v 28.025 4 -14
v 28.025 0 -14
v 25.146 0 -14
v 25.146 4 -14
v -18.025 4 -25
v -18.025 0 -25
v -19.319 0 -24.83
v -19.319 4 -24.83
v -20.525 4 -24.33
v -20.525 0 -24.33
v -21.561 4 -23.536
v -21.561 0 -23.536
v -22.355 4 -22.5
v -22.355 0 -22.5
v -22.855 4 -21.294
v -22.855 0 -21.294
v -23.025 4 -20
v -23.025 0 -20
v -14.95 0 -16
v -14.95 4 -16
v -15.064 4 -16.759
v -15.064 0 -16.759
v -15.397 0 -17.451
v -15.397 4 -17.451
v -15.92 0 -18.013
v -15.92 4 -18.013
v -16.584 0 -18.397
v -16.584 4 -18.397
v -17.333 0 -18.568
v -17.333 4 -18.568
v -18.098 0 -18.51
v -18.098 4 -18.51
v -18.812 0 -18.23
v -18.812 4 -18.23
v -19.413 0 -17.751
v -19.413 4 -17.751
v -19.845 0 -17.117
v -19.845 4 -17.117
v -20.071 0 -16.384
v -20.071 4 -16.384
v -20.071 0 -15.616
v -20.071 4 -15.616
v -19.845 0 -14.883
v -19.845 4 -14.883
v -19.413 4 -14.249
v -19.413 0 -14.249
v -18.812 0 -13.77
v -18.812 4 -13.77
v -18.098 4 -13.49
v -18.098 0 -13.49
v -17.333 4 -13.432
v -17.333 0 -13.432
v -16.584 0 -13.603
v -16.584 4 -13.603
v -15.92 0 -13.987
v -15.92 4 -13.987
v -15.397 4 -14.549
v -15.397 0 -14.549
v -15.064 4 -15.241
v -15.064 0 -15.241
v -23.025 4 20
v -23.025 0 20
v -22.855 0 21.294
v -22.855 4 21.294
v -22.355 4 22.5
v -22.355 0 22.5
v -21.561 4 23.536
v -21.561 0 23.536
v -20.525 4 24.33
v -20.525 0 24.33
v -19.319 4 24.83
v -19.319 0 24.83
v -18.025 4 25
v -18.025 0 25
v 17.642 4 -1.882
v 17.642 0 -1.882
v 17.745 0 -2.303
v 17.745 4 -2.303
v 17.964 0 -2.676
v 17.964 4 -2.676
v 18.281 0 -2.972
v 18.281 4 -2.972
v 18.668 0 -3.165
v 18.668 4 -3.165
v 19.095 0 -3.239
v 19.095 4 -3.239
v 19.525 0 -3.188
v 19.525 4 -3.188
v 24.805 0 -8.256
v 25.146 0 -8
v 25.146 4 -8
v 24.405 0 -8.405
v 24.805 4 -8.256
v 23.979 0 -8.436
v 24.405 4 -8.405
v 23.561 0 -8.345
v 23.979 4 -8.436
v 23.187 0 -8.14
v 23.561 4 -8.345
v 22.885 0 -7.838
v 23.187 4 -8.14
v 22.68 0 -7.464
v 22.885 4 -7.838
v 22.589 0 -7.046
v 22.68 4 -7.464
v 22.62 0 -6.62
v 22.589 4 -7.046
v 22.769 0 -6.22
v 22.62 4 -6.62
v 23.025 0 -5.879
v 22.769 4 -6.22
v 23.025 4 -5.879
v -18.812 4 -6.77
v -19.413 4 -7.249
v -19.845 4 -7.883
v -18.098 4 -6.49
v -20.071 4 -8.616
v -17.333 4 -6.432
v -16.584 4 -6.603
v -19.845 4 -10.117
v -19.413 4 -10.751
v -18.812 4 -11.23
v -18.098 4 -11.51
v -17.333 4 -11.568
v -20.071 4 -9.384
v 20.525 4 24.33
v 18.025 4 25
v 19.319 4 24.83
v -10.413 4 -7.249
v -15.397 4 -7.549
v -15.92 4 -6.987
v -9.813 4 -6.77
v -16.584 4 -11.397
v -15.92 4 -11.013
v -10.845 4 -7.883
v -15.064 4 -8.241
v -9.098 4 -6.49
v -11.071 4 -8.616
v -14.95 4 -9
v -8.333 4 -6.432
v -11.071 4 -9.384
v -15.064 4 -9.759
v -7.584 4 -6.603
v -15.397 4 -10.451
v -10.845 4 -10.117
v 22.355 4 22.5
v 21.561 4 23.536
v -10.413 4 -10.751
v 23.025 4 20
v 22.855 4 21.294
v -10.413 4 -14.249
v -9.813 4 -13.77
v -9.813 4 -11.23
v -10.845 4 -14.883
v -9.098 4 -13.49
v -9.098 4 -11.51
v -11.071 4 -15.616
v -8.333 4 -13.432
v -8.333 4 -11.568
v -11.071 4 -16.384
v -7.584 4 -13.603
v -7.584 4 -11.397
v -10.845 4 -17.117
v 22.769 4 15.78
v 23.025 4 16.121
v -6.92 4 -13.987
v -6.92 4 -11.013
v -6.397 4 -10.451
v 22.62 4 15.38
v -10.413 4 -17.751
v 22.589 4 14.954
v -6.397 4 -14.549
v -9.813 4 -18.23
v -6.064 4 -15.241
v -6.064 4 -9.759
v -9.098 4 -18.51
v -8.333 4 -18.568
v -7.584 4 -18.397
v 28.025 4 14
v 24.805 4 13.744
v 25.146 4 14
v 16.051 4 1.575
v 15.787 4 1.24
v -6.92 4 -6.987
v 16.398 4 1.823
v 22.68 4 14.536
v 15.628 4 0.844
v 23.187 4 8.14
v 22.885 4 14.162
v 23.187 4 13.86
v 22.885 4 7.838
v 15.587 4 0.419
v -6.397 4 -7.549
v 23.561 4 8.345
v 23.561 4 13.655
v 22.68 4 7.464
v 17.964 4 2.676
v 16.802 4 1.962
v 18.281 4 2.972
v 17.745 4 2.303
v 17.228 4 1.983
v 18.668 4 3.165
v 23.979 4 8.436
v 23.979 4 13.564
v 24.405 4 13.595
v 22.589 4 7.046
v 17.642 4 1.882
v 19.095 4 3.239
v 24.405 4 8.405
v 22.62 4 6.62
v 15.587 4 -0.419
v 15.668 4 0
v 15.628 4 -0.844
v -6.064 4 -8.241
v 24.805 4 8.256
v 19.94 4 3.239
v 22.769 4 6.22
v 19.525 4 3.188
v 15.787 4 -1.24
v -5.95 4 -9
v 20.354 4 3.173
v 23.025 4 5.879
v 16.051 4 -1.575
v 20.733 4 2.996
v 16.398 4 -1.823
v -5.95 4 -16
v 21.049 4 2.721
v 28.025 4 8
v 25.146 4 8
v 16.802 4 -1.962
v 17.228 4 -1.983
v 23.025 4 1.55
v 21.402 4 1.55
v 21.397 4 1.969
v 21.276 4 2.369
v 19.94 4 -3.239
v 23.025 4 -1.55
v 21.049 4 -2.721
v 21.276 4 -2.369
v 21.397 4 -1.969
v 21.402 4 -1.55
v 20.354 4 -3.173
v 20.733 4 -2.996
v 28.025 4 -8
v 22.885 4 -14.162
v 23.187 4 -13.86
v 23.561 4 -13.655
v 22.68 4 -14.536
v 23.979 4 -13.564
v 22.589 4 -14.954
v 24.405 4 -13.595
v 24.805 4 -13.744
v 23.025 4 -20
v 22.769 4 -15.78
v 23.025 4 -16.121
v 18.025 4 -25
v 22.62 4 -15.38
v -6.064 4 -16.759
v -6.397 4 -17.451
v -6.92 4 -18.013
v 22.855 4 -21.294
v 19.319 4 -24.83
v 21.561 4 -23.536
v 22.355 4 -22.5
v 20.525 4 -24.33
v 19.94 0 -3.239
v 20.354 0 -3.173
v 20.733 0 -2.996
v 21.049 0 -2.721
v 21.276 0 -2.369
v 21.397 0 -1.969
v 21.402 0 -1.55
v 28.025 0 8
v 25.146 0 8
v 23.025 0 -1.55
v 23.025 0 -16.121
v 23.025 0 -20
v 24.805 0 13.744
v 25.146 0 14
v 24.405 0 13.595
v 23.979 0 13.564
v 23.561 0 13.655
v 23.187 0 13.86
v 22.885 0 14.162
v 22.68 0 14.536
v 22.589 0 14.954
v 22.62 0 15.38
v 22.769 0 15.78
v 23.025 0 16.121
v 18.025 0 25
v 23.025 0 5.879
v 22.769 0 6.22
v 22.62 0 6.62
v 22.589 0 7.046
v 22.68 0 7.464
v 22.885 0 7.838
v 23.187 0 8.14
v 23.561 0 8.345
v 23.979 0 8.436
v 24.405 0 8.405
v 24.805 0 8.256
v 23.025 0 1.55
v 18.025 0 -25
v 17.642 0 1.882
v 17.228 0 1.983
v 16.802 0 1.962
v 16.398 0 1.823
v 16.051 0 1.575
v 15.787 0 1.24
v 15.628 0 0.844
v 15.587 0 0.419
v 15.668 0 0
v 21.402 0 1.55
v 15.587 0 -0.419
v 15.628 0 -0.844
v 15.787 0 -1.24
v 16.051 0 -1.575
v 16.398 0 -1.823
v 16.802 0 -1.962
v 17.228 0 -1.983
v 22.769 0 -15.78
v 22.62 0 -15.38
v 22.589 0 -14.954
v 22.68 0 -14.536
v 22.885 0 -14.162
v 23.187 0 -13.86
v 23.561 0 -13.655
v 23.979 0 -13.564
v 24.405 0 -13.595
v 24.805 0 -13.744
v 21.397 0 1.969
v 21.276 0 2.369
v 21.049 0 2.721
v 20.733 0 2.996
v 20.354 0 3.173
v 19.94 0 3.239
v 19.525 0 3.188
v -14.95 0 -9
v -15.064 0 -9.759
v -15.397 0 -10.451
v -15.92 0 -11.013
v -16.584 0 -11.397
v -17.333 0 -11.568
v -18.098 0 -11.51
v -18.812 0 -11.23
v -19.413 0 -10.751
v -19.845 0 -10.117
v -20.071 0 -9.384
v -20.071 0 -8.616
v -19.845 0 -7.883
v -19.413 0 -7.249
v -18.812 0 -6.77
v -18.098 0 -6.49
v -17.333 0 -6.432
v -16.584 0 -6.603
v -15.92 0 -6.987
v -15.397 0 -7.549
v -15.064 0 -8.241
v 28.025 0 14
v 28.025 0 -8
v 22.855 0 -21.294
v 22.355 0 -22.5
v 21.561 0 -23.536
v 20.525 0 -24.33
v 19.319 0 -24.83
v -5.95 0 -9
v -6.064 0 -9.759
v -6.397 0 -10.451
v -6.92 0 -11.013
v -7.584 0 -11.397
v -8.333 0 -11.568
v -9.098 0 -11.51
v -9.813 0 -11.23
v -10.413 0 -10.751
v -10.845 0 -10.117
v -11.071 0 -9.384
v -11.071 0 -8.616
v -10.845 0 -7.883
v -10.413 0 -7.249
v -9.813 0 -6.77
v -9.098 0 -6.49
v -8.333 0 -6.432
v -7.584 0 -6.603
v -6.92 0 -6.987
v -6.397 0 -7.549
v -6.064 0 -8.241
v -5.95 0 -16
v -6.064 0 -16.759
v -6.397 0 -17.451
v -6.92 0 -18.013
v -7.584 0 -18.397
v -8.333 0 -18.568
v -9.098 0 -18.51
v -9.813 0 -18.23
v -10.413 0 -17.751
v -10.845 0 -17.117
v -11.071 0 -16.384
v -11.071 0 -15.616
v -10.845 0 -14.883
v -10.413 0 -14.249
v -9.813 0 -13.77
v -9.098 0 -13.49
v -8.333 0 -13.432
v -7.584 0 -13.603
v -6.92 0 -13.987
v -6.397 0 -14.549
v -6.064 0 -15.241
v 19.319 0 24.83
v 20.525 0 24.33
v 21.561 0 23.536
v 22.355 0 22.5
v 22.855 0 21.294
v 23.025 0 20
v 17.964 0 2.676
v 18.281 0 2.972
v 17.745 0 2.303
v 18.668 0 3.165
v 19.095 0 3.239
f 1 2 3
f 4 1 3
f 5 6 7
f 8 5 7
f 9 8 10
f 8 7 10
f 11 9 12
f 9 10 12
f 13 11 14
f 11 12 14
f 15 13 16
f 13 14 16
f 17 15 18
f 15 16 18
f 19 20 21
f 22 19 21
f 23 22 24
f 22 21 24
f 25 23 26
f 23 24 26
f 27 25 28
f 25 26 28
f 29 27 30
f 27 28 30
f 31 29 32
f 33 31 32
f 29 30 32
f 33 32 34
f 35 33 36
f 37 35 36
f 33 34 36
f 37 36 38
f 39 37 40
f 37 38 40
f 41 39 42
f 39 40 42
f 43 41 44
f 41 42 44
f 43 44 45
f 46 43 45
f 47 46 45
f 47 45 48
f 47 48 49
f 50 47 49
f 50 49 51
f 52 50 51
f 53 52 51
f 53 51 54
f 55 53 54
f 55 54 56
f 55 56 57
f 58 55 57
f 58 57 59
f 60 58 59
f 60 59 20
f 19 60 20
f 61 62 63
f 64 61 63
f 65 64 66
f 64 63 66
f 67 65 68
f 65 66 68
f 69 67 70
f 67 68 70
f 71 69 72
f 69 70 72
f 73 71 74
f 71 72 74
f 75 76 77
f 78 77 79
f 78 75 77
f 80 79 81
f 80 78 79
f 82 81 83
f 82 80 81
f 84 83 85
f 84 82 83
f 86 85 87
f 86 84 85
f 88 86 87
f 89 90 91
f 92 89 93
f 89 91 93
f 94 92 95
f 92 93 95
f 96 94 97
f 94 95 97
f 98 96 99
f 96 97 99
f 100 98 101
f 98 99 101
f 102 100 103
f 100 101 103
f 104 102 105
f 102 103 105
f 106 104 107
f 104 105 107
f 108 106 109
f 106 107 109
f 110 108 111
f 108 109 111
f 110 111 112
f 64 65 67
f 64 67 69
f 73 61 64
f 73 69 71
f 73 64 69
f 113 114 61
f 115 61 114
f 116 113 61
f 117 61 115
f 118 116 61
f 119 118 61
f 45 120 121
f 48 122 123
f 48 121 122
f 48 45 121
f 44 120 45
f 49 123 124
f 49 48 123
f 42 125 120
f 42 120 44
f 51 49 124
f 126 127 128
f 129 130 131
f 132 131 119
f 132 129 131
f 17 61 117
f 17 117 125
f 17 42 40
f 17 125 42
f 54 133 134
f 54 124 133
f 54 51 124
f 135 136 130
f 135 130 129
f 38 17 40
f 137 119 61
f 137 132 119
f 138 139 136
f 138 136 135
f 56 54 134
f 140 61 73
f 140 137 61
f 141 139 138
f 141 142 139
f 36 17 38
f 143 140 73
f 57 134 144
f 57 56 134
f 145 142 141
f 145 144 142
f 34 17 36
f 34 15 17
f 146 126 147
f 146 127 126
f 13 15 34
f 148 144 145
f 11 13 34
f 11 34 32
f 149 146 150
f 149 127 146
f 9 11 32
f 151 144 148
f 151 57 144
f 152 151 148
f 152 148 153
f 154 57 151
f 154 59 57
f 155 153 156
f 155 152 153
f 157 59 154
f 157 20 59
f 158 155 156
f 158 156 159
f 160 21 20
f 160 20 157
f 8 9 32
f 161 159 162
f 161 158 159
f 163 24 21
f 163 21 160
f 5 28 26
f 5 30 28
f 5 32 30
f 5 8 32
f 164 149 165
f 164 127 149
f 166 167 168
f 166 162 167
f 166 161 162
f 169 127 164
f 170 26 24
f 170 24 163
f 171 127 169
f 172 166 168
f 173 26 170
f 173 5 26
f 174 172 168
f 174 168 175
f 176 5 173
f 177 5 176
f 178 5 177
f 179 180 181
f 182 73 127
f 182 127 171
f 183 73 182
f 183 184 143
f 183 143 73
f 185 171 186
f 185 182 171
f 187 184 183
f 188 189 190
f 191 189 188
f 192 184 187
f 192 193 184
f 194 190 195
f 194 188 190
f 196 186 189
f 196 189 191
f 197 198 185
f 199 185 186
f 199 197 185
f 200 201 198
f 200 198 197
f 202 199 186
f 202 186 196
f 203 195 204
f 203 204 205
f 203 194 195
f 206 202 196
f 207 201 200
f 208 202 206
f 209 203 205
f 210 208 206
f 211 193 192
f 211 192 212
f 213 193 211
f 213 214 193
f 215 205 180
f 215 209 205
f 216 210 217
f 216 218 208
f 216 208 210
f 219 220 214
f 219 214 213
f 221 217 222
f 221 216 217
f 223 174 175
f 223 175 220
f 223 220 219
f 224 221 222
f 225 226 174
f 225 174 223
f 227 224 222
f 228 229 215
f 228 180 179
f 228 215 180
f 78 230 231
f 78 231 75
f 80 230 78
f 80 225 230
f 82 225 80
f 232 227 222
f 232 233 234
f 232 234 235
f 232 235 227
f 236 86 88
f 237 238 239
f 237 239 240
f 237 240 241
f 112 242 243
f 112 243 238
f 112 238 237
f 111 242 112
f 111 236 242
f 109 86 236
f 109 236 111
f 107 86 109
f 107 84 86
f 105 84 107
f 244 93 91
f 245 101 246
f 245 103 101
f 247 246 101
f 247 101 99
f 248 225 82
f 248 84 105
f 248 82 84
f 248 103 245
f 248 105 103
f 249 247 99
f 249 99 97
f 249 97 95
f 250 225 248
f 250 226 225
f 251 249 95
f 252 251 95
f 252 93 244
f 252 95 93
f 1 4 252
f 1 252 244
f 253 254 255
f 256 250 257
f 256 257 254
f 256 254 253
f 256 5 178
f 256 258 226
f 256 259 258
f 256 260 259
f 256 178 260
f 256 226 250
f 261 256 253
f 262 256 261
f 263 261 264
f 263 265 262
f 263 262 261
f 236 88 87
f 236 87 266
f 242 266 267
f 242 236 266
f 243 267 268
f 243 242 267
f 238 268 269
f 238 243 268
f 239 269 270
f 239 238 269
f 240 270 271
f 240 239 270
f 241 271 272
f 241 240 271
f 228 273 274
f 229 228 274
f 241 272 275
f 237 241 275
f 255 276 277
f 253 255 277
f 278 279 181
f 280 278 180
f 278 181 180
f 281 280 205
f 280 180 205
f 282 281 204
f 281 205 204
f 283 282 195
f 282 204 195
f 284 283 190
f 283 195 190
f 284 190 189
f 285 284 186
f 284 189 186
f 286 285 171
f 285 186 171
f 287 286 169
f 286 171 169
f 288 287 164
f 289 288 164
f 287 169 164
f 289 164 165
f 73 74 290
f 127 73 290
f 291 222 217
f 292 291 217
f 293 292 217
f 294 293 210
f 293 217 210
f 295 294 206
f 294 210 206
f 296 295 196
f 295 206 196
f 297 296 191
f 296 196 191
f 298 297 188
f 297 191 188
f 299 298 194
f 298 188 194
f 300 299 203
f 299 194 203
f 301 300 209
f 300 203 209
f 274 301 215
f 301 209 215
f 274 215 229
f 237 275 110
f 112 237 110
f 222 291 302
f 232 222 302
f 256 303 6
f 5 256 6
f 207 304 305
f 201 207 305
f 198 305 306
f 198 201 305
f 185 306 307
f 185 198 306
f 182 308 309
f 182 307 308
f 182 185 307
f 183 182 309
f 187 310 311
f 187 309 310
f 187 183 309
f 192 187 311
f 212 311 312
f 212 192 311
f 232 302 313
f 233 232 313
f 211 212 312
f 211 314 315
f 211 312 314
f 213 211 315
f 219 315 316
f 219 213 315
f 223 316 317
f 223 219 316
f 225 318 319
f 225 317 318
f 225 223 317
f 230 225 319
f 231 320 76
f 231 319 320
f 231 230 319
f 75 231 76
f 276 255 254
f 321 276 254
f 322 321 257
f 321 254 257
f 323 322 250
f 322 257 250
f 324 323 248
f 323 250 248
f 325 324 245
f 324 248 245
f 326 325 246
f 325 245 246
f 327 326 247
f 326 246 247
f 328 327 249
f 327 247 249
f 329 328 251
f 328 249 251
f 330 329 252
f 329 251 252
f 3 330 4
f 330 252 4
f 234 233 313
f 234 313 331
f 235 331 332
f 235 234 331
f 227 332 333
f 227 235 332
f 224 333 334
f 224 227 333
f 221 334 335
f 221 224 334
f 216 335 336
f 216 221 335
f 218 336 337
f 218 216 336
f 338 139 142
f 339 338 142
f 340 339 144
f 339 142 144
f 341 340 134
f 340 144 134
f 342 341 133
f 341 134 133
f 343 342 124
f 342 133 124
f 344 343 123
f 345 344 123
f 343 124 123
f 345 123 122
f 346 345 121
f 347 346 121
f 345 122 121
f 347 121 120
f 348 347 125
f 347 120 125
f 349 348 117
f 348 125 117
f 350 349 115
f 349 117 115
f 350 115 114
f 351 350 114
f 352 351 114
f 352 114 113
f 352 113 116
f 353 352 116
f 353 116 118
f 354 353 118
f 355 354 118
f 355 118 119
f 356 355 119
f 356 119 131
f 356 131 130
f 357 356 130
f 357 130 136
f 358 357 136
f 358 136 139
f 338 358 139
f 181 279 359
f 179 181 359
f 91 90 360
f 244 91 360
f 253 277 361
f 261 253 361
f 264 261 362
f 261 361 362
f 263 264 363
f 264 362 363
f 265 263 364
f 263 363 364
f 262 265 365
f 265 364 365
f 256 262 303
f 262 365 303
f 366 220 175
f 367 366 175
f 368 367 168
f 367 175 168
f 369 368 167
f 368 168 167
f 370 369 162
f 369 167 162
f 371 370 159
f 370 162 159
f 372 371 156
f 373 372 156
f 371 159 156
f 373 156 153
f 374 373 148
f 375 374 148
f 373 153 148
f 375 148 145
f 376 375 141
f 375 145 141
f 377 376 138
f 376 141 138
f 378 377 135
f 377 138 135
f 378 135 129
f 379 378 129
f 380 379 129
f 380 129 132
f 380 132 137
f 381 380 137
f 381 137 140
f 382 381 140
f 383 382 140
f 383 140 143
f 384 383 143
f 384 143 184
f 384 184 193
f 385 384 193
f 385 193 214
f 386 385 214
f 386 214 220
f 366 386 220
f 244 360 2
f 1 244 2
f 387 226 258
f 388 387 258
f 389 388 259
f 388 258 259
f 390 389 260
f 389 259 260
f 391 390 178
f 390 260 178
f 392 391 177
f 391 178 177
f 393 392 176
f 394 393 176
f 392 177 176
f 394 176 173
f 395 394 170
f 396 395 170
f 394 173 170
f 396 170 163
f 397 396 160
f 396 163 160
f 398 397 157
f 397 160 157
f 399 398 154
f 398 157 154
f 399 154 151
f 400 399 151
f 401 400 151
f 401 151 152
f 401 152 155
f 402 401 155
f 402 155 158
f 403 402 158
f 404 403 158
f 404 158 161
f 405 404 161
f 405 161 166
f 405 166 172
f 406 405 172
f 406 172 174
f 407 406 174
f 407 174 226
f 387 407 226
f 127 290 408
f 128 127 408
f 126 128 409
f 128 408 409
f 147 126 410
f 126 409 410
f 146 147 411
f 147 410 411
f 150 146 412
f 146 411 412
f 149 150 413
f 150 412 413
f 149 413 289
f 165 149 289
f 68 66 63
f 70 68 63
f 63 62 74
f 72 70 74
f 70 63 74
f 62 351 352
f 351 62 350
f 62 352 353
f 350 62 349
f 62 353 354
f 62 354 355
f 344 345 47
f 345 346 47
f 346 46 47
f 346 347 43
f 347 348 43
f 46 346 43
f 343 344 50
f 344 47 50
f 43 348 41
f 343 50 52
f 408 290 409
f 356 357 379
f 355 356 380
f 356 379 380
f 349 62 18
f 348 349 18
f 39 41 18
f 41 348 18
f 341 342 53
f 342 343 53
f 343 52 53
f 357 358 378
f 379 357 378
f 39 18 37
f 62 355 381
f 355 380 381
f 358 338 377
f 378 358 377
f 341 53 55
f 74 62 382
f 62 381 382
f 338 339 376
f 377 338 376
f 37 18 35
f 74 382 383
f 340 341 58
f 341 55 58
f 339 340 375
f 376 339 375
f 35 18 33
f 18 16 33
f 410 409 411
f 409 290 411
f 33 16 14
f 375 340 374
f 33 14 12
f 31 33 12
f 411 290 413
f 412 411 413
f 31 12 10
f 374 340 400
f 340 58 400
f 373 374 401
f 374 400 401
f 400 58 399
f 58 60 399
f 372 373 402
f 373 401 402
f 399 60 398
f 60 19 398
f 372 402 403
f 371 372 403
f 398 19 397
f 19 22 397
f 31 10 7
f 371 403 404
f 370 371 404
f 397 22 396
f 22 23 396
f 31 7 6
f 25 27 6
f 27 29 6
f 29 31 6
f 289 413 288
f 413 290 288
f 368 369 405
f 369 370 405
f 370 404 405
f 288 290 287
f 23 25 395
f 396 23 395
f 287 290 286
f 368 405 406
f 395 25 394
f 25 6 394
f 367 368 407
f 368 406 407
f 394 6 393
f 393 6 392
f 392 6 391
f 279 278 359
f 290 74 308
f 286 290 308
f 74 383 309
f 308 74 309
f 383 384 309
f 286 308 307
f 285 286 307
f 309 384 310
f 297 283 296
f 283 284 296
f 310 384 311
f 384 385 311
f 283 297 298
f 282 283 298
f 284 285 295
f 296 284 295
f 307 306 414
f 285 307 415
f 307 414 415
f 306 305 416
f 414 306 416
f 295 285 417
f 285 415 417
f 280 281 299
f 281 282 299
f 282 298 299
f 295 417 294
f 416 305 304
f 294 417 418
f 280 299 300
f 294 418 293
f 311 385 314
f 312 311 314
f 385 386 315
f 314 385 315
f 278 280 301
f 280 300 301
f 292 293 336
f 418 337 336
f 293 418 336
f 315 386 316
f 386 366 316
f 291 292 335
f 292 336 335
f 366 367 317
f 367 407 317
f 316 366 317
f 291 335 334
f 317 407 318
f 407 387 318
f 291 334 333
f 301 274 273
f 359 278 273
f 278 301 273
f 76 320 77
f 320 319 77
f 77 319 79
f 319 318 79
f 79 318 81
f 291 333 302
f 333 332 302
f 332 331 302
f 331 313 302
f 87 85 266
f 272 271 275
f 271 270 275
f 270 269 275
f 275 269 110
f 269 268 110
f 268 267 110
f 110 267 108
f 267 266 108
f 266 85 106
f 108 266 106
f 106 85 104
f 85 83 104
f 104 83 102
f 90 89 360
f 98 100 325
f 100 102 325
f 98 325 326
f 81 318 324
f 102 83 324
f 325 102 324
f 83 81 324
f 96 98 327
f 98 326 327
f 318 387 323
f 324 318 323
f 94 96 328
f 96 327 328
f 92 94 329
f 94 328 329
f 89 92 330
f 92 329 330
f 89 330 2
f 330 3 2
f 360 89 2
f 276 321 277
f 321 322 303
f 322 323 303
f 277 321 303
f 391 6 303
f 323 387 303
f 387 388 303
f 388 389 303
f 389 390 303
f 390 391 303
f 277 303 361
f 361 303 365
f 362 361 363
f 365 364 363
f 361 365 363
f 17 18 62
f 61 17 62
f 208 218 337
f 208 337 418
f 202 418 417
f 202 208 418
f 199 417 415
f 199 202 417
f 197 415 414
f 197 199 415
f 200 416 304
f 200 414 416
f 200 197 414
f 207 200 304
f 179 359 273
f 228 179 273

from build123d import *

# Parameters (mm, degrees)
SALIENTE_EXTRUIR1_DEPTH = 4
CORTAR_EXTRUIR4_DEPTH   = 5
CROQUIS10_R             = 1.5
CORTAR_EXTRUIR5_DEPTH   = 5
CROQUIS12_R             = 2.575
CORTAR_EXTRUIR6_DEPTH   = 5


with BuildPart() as part:
    # Croquis1 → Saliente-Extruir1 (new body)
    with BuildSketch(Plane(origin=(0, 0, 0), x_dir=(1, 0, 0), z_dir=(0, 1, 0))):
        with BuildLine():
            Line((-18.025, -25), (18.025, -25))
            ThreePointArc((18.025, -25), (21.560533906, -23.535533906), (23.025, -20))
            Line((23.025, -20), (23.025, -14))
            Line((23.025, -14), (28.025, -14))
            Line((28.025, -14), (28.025, -8))
            Line((28.025, -8), (23.025, -8))
            Line((23.025, -8), (23.025, -1.55))
            Line((23.025, -1.55), (20.975, -1.55))
            Line((20.975, -1.55), (20.975, -2.8))
            Line((20.975, -2.8), (18.075, -2.8))
            Line((18.075, -2.8), (18.075, -1.55))
            Line((18.075, -1.55), (16.025, -1.55))
            Line((16.025, -1.55), (16.025, 1.55))
            Line((16.025, 1.55), (18.075, 1.55))
            Line((18.075, 1.55), (18.075, 2.8))
            Line((18.075, 2.8), (20.975, 2.8))
            Line((20.975, 2.8), (20.975, 1.55))
            Line((20.975, 1.55), (23.025, 1.55))
            Line((23.025, 1.55), (23.025, 8))
            Line((23.025, 8), (28.025, 8))
            Line((28.025, 8), (28.025, 14))
            Line((28.025, 14), (23.025, 14))
            Line((23.025, 14), (23.025, 20))
            ThreePointArc((23.025, 20), (21.560533906, 23.535533906), (18.025, 25))
            Line((18.025, 25), (-18.025, 25))
            ThreePointArc((-18.025, 25), (-21.560533906, 23.535533906), (-23.025, 20))
            Line((-23.025, 20), (-23.025, -20))
            ThreePointArc((-23.025, -20), (-21.560533906, -23.535533906), (-18.025, -25))
        make_face()
    extrude(amount=SALIENTE_EXTRUIR1_DEPTH)

    # Croquis7 → Cortar-Extruir4 (cut, through all)
    with BuildSketch(Plane(origin=(0, 4, 0), x_dir=(1, 0, 0), z_dir=(0, 1, 0))):
        with BuildLine():
            Line((21.402341989, 1.55), (23.025, 1.55))
            Line((23.025, 1.55), (23.025, -1.55))
            Line((23.025, -1.55), (21.402341989, -1.55))
            ThreePointArc((21.402341989, -1.55), (20.900478098, -2.869619136), (19.525, -3.187930349))
            ThreePointArc((19.525, -3.187930349), (18.280747615, -2.971867524), (17.642475162, -1.882163243))
            ThreePointArc((17.642475162, -1.882163243), (16.05076038, -1.575149398), (15.66772275, 0))
            ThreePointArc((15.66772275, 0), (16.05076038, 1.575149398), (17.642475162, 1.882163243))
            ThreePointArc((17.642475162, 1.882163243), (18.280747615, 2.971867524), (19.525, 3.187930349))
            ThreePointArc((19.525, 3.187930349), (20.900478098, 2.869619136), (21.402341989, 1.55))
        make_face()
    extrude(amount=-CORTAR_EXTRUIR4_DEPTH, mode=Mode.SUBTRACT)

    # Croquis10 → Cortar-Extruir5 (cut, through all)
    with BuildSketch(Plane(origin=(0, 4, 0), x_dir=(1, 0, 0), z_dir=(0, 1, 0))):
        with Locations((24.085660172, 15.060660172)):
            Circle(CROQUIS10_R)
        with Locations((24.085660172, 6.939339828)):
            Circle(CROQUIS10_R)
        with Locations((24.085660172, -15.060660172)):
            Circle(CROQUIS10_R)
        with Locations((24.085660172, -6.939339828)):
            Circle(CROQUIS10_R)
    extrude(amount=-CORTAR_EXTRUIR5_DEPTH, mode=Mode.SUBTRACT)

    # Croquis12 → Cortar-Extruir6 (cut, through all)
    with BuildSketch(Plane(origin=(0, 4, 0), x_dir=(1, 0, 0), z_dir=(0, 1, 0))):
        with Locations((-17.525, 16)):
            Circle(CROQUIS12_R)
        with Locations((-8.525, 16)):
            Circle(CROQUIS12_R)
        with Locations((-8.525, 9)):
            Circle(CROQUIS12_R)
        with Locations((-17.525, 9)):
            Circle(CROQUIS12_R)
    extrude(amount=-CORTAR_EXTRUIR6_DEPTH, mode=Mode.SUBTRACT)


solid = part.part
